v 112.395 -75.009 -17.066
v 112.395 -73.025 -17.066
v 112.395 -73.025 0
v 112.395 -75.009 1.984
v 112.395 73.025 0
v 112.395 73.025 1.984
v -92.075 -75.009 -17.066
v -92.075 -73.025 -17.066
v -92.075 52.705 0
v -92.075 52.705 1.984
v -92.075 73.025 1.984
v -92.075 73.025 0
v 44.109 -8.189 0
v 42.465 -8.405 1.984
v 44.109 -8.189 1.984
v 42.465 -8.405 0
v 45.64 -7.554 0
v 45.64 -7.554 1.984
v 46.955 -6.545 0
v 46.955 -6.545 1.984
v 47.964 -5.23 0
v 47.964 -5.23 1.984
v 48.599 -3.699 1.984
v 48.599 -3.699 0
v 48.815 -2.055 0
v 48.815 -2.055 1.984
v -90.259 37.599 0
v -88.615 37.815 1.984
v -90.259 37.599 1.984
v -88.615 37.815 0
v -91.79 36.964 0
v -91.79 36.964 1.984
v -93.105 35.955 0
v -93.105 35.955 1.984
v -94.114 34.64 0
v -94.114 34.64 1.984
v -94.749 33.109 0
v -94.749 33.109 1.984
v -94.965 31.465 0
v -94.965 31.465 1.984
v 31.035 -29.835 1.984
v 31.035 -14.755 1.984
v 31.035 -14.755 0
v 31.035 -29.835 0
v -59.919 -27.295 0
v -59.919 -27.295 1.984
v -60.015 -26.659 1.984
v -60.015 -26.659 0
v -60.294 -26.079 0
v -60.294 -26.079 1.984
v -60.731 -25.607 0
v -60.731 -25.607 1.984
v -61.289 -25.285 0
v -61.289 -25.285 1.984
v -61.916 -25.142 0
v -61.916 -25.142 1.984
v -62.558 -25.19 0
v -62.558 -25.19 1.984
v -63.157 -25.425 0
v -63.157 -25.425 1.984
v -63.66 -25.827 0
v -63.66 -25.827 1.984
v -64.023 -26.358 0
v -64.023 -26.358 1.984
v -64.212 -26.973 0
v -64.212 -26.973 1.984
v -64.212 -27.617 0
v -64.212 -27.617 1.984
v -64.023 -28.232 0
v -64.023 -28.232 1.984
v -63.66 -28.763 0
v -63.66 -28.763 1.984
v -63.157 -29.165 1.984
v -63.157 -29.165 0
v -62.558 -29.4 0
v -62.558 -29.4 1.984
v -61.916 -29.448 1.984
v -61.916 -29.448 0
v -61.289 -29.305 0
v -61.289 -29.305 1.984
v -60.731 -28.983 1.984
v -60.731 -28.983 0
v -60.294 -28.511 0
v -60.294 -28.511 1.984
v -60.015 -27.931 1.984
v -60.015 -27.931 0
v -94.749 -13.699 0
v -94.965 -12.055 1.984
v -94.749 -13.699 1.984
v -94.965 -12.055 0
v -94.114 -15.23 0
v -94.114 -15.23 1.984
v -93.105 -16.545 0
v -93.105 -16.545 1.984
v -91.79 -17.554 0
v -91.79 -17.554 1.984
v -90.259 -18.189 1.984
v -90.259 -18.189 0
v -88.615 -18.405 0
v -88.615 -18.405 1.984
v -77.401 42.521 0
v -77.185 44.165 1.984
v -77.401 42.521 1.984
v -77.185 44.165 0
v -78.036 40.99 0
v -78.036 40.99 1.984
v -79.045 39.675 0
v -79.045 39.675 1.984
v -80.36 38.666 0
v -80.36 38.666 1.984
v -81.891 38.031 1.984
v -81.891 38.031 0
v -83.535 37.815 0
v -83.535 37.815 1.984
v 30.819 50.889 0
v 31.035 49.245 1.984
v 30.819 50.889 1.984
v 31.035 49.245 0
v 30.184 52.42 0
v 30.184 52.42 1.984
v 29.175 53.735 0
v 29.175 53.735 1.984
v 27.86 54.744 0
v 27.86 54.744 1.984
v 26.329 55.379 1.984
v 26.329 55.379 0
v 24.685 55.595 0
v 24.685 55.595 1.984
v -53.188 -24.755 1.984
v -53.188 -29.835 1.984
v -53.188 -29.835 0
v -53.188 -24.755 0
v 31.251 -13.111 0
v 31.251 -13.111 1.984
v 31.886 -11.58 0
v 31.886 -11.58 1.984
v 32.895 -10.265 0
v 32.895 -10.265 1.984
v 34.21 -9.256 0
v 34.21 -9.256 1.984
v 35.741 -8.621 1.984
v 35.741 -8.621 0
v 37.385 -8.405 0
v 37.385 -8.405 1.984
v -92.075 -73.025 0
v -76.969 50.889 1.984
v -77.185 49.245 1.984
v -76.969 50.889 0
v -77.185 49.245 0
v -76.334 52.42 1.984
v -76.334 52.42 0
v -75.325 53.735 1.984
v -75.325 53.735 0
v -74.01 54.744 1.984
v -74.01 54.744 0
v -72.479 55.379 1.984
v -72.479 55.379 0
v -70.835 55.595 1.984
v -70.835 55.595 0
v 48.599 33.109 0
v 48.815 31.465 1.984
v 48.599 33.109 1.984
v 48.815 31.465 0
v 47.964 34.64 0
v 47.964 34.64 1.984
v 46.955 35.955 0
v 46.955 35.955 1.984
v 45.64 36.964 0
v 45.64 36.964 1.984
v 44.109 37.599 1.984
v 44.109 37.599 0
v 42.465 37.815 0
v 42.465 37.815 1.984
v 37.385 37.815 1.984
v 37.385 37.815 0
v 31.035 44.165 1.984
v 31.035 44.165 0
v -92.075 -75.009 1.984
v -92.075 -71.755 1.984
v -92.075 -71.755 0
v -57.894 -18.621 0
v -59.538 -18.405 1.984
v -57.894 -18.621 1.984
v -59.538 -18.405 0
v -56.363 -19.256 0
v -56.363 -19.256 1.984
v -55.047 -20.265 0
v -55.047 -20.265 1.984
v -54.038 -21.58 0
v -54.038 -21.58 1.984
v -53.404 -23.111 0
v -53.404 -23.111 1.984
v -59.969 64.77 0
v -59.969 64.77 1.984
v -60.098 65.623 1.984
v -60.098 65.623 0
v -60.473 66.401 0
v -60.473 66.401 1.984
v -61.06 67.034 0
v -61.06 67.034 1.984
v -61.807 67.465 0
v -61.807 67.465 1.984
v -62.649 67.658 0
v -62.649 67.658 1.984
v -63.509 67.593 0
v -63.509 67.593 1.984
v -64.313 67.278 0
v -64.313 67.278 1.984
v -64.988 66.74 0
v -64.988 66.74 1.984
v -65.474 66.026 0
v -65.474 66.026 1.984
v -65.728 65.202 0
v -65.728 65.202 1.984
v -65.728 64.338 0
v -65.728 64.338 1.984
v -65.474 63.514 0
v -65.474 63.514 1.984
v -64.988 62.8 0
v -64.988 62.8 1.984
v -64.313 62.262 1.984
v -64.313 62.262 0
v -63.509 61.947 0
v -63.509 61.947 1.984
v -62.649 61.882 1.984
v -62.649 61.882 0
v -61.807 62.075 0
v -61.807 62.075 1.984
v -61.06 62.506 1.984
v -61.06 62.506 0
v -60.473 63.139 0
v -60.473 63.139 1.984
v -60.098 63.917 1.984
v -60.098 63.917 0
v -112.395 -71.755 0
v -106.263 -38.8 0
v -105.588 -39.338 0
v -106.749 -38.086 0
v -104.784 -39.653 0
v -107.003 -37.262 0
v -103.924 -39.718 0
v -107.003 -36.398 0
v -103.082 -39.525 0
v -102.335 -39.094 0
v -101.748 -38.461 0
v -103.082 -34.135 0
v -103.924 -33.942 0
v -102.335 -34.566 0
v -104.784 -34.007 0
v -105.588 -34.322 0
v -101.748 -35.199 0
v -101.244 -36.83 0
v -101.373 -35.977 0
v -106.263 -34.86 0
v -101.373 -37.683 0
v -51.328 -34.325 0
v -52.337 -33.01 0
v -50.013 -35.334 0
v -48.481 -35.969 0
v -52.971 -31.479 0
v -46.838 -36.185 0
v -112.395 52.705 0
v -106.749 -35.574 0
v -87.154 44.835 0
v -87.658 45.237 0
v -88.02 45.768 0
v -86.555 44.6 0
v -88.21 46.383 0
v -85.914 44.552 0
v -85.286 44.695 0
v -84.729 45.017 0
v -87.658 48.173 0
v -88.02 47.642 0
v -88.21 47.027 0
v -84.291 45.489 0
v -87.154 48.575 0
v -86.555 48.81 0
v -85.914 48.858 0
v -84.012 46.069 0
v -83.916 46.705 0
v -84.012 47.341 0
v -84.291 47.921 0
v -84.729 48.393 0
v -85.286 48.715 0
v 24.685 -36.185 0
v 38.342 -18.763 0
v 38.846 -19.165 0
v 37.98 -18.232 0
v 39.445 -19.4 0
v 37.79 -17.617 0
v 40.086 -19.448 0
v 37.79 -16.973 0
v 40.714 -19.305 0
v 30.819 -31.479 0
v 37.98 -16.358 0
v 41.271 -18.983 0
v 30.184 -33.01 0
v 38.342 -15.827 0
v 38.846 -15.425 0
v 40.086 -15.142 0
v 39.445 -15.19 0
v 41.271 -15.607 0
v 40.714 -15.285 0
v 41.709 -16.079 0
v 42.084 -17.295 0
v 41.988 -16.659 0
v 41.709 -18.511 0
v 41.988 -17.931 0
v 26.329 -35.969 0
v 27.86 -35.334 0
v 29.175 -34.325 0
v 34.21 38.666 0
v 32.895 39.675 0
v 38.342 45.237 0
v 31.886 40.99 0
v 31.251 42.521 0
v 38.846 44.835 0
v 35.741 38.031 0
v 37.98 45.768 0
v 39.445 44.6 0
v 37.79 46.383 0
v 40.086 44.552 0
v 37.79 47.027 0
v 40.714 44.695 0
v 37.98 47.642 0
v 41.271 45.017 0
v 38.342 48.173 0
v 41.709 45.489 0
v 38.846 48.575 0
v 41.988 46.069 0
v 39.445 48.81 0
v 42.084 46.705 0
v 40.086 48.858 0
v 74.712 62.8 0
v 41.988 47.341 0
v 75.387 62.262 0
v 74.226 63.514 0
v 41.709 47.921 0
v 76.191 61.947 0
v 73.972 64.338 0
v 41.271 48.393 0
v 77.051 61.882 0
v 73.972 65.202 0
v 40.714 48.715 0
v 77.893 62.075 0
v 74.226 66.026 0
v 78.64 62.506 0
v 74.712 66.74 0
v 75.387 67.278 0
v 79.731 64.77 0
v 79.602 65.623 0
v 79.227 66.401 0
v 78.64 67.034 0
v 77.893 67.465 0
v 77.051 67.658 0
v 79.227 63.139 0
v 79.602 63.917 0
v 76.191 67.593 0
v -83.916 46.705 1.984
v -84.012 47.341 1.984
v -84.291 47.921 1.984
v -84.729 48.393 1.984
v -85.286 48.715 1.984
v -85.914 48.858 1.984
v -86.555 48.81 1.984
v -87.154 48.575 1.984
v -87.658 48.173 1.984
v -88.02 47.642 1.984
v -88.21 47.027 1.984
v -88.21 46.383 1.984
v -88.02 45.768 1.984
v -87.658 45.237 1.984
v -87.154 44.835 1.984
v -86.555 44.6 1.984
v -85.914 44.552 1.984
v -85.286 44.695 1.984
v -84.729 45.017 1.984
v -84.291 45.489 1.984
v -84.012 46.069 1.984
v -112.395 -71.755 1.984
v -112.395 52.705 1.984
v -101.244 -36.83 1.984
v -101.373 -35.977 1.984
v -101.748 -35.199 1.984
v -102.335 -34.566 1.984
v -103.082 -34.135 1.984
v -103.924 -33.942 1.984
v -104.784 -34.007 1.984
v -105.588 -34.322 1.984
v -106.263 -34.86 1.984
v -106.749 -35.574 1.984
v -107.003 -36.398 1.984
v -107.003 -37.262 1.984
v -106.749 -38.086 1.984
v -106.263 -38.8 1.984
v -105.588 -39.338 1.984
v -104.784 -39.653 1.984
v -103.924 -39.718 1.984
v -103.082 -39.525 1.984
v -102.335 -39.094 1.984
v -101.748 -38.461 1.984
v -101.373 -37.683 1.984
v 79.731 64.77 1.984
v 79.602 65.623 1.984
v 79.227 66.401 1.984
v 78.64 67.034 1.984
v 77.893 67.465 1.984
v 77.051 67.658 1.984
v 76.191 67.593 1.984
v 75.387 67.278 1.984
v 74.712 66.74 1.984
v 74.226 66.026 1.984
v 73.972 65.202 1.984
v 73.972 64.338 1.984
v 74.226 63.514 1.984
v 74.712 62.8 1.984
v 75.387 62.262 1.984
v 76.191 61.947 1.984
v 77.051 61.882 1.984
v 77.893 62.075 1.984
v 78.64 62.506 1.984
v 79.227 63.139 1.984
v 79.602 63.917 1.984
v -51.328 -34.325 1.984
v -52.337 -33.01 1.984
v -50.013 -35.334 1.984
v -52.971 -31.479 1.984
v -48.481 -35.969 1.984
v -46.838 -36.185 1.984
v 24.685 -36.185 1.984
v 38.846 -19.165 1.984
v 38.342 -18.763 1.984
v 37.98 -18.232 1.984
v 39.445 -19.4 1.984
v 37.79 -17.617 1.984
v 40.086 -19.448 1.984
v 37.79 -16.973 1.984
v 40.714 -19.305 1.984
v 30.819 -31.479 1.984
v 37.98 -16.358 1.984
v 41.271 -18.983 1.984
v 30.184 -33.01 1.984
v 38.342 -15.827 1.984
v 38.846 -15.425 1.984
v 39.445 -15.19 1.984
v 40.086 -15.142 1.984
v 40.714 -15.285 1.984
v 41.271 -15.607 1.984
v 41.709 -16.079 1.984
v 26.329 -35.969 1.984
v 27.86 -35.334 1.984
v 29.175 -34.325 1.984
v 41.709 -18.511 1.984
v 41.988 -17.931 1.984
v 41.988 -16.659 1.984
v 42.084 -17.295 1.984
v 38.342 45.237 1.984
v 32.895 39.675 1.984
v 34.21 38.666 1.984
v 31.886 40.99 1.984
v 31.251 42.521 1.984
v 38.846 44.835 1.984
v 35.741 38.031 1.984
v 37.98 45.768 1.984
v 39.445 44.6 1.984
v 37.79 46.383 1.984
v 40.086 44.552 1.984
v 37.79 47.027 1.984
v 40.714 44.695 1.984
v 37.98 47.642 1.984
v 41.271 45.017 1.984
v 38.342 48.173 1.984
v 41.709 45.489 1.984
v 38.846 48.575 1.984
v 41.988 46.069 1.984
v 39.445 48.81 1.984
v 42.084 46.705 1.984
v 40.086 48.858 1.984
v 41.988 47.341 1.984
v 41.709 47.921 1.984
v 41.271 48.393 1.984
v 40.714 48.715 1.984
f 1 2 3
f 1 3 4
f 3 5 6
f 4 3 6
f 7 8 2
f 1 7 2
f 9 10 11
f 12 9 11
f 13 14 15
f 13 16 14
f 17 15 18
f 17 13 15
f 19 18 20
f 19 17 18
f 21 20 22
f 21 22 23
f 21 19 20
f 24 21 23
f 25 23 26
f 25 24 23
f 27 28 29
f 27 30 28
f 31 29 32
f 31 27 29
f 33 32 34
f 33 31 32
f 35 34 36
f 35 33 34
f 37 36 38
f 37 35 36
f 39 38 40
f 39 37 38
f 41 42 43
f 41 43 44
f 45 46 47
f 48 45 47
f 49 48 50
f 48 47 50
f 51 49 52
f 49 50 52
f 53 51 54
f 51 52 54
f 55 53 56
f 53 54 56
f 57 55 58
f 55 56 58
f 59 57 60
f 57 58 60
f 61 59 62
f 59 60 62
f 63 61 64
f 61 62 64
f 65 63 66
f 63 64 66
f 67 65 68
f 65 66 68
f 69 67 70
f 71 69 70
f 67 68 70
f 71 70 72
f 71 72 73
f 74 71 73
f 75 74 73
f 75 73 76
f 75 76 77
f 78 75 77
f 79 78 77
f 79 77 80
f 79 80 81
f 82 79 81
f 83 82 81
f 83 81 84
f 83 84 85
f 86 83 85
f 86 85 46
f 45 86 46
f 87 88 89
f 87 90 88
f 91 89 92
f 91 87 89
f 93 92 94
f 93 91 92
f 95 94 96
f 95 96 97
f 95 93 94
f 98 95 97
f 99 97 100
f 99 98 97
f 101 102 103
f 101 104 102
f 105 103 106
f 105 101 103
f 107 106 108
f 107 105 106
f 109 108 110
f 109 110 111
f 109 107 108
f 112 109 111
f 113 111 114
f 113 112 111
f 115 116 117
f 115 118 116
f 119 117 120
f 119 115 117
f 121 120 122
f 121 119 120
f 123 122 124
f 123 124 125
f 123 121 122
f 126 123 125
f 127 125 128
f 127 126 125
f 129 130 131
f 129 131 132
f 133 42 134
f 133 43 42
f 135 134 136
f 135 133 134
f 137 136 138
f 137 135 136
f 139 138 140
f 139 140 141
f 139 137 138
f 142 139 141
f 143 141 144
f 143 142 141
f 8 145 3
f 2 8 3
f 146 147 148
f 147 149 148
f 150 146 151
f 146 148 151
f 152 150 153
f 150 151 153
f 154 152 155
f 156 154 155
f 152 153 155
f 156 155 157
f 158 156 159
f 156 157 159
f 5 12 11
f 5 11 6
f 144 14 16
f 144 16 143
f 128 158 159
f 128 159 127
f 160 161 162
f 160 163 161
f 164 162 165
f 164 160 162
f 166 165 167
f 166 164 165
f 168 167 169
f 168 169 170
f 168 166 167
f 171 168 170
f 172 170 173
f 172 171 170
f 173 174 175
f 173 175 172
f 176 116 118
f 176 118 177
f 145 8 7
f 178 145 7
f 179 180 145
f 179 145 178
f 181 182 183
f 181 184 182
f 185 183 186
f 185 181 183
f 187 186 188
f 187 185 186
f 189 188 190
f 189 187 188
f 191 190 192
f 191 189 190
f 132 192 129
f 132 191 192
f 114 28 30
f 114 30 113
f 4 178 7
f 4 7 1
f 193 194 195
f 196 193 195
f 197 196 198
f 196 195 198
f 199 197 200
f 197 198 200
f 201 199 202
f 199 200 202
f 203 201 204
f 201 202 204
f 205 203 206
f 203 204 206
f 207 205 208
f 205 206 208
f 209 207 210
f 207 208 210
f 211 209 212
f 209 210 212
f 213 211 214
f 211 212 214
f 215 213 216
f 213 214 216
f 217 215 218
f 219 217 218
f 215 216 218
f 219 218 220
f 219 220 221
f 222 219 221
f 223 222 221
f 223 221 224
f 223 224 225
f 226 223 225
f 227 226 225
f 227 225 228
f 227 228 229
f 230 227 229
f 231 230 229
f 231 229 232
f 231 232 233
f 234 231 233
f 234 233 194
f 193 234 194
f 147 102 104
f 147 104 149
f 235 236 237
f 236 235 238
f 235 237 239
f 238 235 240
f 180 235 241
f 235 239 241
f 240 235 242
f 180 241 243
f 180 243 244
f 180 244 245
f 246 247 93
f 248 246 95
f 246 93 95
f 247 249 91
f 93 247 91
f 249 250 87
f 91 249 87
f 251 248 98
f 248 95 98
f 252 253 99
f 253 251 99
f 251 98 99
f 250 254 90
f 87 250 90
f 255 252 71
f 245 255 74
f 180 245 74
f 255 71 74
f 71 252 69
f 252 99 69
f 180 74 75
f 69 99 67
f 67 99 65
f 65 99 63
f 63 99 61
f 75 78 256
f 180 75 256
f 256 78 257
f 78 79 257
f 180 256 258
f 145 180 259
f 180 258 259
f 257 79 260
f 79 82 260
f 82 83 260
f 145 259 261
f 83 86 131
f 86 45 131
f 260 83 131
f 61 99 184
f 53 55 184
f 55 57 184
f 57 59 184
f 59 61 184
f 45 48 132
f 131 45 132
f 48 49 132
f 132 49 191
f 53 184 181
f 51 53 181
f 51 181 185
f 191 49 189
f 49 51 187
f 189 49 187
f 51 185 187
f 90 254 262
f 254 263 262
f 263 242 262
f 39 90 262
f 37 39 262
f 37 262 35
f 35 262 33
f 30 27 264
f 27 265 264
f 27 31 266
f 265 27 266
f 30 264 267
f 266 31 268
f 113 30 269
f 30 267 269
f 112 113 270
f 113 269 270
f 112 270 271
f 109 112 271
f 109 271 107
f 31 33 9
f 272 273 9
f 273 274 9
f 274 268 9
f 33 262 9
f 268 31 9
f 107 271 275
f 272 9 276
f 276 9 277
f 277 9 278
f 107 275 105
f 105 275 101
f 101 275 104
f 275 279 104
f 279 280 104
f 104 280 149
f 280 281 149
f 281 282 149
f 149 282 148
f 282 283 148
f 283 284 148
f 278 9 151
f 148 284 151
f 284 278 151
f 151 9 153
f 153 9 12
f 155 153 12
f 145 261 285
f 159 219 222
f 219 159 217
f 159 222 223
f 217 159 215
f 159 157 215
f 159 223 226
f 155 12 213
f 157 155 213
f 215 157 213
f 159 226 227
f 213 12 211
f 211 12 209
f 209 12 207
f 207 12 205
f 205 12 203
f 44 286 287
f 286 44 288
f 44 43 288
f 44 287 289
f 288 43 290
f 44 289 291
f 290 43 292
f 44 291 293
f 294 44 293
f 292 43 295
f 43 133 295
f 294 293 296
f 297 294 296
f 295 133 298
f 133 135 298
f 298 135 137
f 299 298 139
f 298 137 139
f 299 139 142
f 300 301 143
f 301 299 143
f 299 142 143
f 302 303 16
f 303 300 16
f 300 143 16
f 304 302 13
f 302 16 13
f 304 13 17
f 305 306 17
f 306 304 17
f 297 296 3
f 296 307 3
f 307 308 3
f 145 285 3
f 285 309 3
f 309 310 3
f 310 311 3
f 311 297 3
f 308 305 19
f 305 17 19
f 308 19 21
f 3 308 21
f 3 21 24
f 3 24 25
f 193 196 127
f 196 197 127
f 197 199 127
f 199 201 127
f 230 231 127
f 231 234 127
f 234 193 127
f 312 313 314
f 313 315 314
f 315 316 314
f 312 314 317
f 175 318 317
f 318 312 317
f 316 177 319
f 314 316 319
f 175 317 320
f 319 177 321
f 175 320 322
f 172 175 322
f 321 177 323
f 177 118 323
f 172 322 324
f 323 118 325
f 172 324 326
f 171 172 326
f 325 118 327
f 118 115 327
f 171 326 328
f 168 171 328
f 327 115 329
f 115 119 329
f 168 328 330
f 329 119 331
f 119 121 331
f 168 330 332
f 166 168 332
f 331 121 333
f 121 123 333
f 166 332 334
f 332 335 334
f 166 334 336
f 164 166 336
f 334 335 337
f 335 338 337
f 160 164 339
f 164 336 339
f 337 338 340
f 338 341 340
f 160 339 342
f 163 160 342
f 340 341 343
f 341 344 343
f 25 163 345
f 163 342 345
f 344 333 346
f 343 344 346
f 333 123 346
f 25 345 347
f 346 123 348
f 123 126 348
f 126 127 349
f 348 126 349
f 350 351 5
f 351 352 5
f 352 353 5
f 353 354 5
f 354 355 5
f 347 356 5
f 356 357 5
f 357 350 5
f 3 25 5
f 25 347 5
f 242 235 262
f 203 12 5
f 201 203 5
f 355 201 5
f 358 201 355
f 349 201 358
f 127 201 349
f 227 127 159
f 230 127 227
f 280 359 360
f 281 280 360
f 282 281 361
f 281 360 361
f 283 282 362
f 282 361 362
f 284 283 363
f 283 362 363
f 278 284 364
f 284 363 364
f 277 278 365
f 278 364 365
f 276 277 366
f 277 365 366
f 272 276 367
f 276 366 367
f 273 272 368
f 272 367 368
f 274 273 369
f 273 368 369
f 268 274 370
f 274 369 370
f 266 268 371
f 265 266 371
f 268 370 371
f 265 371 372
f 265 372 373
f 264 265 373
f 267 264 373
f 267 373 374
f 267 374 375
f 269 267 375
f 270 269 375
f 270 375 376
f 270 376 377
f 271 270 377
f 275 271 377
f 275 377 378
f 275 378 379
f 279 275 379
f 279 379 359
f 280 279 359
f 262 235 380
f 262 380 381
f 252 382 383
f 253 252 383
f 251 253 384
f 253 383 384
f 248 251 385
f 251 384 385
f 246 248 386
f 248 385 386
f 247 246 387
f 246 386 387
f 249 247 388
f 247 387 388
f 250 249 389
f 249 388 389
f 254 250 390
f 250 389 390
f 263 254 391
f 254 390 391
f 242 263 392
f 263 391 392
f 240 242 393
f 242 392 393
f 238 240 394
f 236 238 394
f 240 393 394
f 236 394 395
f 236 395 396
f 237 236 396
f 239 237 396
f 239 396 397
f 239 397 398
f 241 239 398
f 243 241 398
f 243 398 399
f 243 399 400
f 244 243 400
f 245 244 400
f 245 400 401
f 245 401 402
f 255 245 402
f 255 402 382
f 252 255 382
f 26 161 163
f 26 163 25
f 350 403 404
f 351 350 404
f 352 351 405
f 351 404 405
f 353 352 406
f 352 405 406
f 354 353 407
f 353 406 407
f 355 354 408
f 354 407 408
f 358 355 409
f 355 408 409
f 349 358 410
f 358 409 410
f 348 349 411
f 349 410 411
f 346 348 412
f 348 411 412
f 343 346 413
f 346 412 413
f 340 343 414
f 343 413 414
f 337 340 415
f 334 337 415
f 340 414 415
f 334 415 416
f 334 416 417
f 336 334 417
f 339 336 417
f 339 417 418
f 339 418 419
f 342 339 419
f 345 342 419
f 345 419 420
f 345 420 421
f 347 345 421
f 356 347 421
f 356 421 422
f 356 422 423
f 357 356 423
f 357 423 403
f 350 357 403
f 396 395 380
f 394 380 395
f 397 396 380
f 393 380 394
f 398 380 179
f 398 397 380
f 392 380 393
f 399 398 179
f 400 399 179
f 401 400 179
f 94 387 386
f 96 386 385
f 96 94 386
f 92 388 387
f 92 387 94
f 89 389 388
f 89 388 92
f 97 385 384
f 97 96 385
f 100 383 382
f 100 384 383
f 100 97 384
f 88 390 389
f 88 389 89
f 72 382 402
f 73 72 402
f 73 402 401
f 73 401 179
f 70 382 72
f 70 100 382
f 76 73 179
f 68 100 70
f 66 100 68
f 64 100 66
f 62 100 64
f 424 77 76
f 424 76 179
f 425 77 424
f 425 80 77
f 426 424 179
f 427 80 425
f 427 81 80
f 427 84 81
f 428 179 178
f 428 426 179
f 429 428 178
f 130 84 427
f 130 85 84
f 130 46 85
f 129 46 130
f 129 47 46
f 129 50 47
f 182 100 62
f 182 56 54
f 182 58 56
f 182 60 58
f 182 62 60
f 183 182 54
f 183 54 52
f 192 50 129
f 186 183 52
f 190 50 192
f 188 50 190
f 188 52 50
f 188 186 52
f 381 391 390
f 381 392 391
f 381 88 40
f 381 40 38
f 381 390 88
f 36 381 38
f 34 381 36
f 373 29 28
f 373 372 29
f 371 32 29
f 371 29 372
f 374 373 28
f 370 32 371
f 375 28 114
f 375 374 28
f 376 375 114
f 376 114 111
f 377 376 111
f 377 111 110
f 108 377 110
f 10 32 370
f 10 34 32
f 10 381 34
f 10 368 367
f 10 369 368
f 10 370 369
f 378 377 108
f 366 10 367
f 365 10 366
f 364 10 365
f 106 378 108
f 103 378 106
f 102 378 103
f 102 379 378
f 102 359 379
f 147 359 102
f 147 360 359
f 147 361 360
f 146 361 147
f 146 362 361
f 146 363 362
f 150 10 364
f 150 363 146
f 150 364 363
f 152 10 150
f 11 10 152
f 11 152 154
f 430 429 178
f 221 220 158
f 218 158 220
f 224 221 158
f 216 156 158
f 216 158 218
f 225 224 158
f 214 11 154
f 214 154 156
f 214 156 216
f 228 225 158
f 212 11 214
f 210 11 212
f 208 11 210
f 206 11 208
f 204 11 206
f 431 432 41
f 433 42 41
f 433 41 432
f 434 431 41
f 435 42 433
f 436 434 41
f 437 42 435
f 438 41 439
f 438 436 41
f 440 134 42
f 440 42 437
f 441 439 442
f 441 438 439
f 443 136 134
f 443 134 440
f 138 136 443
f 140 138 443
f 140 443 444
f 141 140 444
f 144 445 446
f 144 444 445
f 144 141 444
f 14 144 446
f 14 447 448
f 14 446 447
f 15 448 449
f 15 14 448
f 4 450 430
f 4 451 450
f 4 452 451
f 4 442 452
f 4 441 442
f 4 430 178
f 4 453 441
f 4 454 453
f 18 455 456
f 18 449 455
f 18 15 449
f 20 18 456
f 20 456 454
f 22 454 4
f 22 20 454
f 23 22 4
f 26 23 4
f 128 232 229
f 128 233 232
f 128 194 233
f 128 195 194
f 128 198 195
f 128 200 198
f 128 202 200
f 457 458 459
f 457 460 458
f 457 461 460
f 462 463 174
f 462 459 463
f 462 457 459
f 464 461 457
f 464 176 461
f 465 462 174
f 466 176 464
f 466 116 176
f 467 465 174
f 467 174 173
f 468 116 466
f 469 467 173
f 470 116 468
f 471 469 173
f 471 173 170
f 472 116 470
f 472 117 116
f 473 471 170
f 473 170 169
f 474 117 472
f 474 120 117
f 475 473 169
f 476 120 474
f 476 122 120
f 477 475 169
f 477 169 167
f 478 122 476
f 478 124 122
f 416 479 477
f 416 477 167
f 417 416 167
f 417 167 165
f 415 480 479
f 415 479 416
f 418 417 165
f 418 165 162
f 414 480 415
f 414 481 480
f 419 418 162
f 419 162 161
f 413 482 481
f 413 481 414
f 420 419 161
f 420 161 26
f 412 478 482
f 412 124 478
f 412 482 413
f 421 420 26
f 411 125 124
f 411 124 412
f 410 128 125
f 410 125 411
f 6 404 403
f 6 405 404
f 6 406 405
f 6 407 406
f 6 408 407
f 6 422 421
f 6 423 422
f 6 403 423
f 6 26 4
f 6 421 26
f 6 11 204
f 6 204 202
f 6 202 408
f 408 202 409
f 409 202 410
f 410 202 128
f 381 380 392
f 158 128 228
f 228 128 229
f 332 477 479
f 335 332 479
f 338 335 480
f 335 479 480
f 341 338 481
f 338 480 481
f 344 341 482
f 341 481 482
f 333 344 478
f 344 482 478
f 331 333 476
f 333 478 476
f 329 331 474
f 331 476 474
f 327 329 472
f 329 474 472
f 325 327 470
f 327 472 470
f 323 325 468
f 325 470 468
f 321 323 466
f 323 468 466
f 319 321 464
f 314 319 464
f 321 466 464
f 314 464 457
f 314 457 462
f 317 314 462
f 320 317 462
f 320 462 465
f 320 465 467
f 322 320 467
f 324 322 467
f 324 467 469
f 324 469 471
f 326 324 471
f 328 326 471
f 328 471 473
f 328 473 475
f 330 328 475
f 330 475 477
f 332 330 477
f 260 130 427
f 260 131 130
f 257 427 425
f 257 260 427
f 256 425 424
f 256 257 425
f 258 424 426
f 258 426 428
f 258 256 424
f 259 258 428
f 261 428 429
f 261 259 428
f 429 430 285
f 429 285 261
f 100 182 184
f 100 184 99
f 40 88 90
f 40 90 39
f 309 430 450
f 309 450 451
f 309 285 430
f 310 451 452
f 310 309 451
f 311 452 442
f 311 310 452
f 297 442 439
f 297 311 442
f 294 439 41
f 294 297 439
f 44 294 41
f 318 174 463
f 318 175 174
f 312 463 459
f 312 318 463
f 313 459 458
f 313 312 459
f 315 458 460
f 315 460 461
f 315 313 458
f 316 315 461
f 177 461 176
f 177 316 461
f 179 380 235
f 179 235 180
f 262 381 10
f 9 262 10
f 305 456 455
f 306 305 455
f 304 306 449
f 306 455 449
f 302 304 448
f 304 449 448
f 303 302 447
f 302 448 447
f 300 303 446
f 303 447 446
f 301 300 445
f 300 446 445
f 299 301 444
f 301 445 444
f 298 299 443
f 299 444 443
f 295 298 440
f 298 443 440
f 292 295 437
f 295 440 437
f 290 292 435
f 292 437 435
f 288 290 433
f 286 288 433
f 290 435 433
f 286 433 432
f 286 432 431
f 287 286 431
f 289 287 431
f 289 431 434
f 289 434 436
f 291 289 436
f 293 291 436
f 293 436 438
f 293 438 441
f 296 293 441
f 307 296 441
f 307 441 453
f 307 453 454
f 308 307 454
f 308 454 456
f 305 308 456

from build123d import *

# Parameters (mm, degrees)
SKETCH1_W            = 224.79
SKETCH1_H            = 146.05
BOSS_EXTRUDE1_DEPTH  = 1.98374
SKETCH2_W            = 20.32
SKETCH2_H            = 20.32
SKETCH2_H_2          = 1.27
CORNER_CUT_DEPTH     = 135.049326274
SKETCH3_R            = 2.159
PS_MOUNT_HOLES_DEPTH = 135.049326274
PS_CUTOUT_DEPTH      = 135.049326274
FILLET11_R           = 6.35
SKETCH5_R            = 2.8956
FRAME_MOUNTS_DEPTH   = 135.049326274
SKETCH8_W            = 204.47
SKETCH8_H            = 19.05
BOSS_EXTRUDE2_DEPTH  = 1.98374


with BuildPart() as part:
    # Sketch1 → Boss-Extrude1 (new body)
    with BuildSketch(Plane.XY):
        Rectangle(SKETCH1_W, SKETCH1_H)
    extrude(amount=BOSS_EXTRUDE1_DEPTH)

    # Sketch2 → Corner Cut (cut, through all)
    with BuildSketch(Plane.XY.offset(1.98374)):
        with Locations((-102.235, 62.865)):
            Rectangle(SKETCH2_W, SKETCH2_H)
        with Locations((-102.235, -72.39)):
            Rectangle(SKETCH2_W, SKETCH2_H_2)
    extrude(amount=-CORNER_CUT_DEPTH, mode=Mode.SUBTRACT)

    # Sketch3 → PS Mount Holes (cut, through all)
    with BuildSketch(Plane.XY.offset(1.98374)):
        with Locations((-86.075, 46.705)):
            Circle(SKETCH3_R)
        with Locations((-62.0776, -27.295)):
            Circle(SKETCH3_R)
        with Locations((39.925000098, -17.295)):
            Circle(SKETCH3_R)
        with Locations((39.925000098, 46.705)):
            Circle(SKETCH3_R)
    extrude(amount=-PS_MOUNT_HOLES_DEPTH, mode=Mode.SUBTRACT)

    # Sketch4 → PS Cutout (cut, through all)
    with BuildSketch(Plane.XY.offset(1.98374)):
        Polygon((-77.185, 55.595), (31.035000098, 55.595), (31.035000098, 37.815), (48.815000098, 37.815), (48.815000098, -8.405), (31.035000098, -8.405), (31.035000098, -36.185), (-53.1876, -36.185), (-53.1876, -18.405), (-94.965, -18.405), (-94.965, 37.815), (-77.185, 37.815), align=None)
    extrude(amount=-PS_CUTOUT_DEPTH, mode=Mode.SUBTRACT)

    # Fillet11
    fillet11_edges = [part.edges().sort_by_distance(p)[0] for p in [
        (-77.185, 37.815, 0.99187),
        (-77.185, 55.595, 0.99187),
        (31.035000098, 55.595, 0.99187),
        (31.035000098, 37.815, 0.99187),
        (48.815000098, 37.815, 0.99187),
        (48.815000098, -8.405, 0.99187),
        (31.035000098, -8.405, 0.99187),
        (31.035000098, -36.185, 0.99187),
        (-53.1876, -36.185, 0.99187),
        (-53.1876, -18.405, 0.99187),
        (-94.965, -18.405, 0.99187),
        (-94.965, 37.815, 0.99187),
    ]]
    fillet(fillet11_edges, radius=FILLET11_R)

    # Sketch5 → Frame-Mounts (cut, through all)
    with BuildSketch(Plane.XY.offset(1.98374)):
        with Locations((-62.865, 64.77)):
            Circle(SKETCH5_R)
        with Locations((76.835, 64.77)):
            Circle(SKETCH5_R)
        with Locations((-104.14, -36.83)):
            Circle(SKETCH5_R)
    extrude(amount=-FRAME_MOUNTS_DEPTH, mode=Mode.SUBTRACT)

    # Sketch8 → Boss-Extrude2 (add)
    with BuildSketch(Plane.XZ.offset(73.025)):
        with Locations((10.16, -7.54126)):
            Rectangle(SKETCH8_W, SKETCH8_H)
    extrude(amount=BOSS_EXTRUDE2_DEPTH)


solid = part.part
